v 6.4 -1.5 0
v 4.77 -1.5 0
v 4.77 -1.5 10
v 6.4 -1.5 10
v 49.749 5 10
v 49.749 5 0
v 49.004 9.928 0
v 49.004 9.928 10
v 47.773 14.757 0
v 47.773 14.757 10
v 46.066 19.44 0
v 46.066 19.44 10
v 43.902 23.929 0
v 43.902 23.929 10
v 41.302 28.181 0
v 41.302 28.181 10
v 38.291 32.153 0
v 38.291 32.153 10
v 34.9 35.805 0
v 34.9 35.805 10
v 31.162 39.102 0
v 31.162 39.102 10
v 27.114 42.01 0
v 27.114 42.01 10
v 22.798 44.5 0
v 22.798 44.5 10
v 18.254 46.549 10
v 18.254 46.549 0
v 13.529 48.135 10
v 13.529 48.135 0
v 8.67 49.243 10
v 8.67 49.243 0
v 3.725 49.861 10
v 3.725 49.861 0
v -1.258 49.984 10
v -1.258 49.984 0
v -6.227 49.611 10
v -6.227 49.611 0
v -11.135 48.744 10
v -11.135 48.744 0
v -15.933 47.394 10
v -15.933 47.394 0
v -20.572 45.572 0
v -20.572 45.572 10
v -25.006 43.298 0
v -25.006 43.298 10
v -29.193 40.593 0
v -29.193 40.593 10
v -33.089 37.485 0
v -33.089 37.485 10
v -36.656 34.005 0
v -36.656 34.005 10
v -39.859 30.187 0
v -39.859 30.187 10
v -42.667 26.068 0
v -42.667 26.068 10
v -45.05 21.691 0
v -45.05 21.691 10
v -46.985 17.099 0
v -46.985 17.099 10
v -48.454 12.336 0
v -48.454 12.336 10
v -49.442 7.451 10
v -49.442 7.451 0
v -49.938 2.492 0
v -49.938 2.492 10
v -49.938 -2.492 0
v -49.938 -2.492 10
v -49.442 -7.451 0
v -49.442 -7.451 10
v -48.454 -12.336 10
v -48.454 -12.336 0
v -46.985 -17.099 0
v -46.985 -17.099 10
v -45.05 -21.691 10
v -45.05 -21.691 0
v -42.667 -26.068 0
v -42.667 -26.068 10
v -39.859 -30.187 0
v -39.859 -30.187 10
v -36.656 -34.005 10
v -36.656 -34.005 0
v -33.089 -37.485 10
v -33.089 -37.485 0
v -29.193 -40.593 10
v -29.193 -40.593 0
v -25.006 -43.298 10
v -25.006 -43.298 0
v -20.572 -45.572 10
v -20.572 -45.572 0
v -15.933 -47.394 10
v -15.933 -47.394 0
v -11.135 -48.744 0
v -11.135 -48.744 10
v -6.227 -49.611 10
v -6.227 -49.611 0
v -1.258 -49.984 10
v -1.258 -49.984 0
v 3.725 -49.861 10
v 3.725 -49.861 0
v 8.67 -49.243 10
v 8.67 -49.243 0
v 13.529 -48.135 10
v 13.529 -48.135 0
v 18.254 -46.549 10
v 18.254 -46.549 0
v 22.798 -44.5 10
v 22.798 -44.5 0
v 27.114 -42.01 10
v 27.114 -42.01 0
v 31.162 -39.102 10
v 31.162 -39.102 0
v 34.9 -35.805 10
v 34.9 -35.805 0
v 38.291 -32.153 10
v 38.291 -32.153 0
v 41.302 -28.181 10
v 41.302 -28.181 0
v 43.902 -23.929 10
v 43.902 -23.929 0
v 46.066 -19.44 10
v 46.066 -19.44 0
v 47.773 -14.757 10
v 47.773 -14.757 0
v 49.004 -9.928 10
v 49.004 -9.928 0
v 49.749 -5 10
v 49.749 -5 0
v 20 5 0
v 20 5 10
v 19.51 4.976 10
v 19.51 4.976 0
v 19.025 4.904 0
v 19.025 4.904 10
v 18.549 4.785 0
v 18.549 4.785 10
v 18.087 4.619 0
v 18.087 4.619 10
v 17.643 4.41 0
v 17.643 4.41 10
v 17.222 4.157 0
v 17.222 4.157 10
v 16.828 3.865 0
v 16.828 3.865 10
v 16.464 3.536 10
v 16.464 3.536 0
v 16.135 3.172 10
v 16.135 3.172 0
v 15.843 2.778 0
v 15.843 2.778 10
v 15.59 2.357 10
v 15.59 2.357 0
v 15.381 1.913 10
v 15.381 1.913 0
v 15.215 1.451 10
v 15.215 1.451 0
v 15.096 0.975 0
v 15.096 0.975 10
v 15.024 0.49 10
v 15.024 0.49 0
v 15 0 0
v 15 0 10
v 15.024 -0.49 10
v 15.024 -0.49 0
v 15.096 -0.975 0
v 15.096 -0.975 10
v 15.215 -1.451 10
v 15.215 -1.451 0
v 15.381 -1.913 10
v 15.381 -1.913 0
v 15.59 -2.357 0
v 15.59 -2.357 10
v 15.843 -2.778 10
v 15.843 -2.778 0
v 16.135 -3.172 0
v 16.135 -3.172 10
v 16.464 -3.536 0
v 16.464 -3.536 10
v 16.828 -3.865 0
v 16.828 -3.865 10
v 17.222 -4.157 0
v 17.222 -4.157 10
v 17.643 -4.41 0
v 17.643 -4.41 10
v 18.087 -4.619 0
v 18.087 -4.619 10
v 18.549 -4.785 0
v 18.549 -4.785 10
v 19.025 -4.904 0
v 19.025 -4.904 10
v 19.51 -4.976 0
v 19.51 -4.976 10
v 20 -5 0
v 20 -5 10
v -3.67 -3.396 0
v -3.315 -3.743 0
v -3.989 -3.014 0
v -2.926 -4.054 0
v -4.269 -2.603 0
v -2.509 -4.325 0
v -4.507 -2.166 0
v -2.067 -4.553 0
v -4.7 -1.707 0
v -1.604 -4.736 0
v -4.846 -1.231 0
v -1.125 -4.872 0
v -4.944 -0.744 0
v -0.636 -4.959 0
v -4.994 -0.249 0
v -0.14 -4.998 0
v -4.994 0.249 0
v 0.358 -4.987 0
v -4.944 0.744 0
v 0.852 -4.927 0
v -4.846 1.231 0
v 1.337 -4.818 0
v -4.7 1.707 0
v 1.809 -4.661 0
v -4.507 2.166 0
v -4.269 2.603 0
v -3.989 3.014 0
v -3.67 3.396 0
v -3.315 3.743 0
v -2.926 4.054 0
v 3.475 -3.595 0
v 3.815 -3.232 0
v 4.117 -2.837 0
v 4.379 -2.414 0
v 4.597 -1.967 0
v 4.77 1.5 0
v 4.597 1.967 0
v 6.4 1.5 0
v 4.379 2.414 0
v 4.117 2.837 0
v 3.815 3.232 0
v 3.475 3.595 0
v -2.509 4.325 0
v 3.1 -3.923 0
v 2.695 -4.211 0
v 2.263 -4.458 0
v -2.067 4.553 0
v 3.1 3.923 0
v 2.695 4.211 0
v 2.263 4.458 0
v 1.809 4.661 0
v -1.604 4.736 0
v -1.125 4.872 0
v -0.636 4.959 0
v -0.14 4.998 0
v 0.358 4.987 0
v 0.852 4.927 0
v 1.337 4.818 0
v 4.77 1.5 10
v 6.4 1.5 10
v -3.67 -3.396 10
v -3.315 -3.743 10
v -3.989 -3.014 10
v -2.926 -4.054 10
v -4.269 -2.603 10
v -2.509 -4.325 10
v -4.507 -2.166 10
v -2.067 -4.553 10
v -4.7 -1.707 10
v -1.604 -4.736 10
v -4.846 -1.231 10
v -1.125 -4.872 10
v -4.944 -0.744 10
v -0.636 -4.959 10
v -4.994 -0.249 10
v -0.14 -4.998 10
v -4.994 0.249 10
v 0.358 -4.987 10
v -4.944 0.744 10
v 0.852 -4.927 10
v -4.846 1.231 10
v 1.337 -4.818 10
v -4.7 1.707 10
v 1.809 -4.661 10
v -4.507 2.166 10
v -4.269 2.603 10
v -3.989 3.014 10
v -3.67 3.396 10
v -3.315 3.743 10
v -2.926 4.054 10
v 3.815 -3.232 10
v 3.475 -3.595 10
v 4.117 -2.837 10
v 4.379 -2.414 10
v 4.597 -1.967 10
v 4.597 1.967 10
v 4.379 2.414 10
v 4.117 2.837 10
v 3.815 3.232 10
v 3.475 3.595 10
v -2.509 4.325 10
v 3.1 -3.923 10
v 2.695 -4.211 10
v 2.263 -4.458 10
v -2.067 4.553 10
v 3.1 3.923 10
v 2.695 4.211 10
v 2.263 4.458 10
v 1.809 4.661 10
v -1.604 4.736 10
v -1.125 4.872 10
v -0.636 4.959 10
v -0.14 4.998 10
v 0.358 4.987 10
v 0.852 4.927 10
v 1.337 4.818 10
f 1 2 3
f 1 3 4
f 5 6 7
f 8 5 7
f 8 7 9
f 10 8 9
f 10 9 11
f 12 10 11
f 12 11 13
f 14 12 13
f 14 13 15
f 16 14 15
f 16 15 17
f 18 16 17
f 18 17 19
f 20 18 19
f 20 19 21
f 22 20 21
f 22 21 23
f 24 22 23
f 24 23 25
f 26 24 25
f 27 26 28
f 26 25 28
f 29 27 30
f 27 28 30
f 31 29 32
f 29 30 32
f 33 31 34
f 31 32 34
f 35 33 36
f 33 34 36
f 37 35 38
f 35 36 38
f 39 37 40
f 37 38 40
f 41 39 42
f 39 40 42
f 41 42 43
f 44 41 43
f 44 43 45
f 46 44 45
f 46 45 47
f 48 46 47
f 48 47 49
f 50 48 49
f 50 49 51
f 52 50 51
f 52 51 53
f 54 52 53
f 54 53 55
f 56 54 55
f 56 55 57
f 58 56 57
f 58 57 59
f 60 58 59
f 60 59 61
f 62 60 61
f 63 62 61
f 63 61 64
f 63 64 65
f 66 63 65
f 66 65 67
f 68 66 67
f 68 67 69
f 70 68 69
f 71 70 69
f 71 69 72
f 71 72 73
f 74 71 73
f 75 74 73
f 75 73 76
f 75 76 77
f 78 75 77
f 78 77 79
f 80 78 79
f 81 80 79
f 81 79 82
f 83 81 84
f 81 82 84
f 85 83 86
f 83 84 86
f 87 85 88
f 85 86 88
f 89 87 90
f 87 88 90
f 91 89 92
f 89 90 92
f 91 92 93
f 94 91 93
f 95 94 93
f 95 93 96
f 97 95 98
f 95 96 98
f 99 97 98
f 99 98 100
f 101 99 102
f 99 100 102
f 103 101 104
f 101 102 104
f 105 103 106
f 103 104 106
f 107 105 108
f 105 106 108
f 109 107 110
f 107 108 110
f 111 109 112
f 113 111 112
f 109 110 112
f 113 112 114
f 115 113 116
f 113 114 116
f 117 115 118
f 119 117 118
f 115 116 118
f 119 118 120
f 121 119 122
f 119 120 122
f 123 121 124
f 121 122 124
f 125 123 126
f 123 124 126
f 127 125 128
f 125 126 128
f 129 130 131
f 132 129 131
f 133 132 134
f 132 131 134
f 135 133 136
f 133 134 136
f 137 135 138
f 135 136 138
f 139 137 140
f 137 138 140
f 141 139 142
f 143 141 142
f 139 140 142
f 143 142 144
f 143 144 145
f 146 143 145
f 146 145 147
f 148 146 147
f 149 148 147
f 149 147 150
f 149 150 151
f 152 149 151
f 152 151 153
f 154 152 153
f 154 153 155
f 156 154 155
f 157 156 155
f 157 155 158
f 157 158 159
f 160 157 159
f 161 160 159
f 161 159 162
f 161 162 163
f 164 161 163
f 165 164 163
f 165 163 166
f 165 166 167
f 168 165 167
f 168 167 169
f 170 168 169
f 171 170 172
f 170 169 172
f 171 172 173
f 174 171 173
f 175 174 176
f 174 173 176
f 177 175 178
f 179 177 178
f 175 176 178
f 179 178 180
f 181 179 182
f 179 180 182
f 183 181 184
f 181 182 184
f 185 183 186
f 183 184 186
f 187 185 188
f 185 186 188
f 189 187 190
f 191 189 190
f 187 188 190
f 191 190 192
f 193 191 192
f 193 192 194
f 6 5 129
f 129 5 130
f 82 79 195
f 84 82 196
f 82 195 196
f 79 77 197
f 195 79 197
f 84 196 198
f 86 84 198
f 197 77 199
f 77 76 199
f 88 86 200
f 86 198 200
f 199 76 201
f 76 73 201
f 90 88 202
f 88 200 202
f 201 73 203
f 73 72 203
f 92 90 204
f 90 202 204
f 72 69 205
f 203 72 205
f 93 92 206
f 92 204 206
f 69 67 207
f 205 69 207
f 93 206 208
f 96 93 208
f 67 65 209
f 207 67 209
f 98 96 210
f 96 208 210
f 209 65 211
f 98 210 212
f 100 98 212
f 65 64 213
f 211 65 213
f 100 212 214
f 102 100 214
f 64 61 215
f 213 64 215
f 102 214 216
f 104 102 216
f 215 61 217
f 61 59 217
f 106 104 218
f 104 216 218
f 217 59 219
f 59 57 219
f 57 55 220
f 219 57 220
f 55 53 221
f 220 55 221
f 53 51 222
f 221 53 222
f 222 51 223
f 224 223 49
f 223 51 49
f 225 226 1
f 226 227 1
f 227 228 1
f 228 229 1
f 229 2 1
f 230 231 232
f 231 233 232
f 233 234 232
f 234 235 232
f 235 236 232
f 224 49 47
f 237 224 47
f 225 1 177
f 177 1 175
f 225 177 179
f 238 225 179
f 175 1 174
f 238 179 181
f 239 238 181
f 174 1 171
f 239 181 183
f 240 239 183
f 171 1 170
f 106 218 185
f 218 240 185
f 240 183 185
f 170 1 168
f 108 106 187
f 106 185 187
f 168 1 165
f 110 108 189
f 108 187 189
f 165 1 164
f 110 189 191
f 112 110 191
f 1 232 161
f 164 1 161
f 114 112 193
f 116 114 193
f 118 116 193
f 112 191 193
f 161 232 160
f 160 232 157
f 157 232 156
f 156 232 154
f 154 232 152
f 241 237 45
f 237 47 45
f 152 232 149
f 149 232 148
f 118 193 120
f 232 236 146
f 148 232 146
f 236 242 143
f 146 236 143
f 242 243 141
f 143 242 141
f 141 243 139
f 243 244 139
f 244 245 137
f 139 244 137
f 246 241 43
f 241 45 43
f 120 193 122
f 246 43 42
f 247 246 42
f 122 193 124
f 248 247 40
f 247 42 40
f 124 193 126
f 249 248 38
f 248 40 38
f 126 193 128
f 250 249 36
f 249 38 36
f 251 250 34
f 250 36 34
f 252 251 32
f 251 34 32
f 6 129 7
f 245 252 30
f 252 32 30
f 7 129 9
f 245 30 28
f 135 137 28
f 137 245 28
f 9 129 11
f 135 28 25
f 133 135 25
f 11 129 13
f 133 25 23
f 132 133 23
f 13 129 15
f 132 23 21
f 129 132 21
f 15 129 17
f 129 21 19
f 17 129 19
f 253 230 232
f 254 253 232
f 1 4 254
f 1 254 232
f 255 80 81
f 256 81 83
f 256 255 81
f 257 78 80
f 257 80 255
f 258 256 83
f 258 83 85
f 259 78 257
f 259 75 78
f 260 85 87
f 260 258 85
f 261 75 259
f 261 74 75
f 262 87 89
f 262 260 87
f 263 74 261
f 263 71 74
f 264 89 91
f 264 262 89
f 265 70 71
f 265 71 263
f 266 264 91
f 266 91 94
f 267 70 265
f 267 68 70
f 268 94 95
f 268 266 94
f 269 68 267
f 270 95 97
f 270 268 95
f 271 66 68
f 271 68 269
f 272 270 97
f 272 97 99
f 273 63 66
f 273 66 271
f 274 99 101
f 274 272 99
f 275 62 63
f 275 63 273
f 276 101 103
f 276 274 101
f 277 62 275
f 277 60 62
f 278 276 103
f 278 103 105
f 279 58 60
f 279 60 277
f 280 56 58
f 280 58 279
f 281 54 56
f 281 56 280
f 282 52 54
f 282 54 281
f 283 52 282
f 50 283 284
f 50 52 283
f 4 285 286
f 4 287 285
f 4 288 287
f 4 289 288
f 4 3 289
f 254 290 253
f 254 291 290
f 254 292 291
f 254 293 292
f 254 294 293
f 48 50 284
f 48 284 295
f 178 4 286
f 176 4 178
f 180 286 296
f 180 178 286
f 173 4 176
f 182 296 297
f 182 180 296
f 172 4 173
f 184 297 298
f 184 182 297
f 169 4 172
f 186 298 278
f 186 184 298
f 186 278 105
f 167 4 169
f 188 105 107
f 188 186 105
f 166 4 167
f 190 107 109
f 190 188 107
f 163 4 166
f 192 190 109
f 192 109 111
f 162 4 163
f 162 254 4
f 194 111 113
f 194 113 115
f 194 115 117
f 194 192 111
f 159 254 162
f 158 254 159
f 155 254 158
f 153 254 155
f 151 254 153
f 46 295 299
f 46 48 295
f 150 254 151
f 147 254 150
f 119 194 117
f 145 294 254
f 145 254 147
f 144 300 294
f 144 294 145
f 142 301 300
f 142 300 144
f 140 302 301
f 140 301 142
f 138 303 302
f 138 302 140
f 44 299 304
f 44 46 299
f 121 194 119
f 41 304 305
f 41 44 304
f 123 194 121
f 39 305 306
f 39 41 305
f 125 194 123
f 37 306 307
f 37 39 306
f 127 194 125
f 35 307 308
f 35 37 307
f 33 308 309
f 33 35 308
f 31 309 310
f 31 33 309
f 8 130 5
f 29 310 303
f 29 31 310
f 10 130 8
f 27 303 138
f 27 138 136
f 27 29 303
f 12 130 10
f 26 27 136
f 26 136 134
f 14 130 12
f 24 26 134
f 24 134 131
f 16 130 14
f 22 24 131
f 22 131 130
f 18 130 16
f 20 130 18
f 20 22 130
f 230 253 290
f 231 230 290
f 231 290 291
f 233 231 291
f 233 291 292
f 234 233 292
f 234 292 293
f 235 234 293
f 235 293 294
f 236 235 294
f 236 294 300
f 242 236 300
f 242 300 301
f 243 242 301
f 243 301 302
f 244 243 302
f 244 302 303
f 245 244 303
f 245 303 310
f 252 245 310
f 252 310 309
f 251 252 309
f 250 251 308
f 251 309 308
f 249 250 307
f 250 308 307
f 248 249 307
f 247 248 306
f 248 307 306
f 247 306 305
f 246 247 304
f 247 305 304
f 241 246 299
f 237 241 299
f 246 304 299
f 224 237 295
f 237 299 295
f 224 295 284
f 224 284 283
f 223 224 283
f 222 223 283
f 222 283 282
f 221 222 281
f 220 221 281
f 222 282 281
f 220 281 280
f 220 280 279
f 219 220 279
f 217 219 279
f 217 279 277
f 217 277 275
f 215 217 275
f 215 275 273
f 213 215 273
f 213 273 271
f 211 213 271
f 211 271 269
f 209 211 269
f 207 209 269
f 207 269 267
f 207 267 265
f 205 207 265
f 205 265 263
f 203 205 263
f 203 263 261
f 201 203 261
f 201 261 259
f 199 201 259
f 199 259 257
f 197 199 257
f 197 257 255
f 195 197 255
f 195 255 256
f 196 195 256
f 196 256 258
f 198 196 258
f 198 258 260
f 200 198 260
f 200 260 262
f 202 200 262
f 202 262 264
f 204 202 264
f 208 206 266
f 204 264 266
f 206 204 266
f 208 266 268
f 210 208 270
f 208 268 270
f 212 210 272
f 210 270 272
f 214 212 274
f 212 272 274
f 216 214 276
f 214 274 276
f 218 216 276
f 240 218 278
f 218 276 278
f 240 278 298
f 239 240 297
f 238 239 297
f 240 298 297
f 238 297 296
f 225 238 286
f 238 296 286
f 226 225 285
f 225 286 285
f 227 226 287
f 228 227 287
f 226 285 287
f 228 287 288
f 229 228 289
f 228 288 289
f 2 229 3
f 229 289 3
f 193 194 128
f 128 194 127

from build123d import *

# Parameters (mm, degrees)
SKETCH_1_R               = 50
EXTRUDE_1_DEPTH          = 10
SKETCH_2_R               = 5
CUT_EXTRUDE_1_DEPTH      = 72.414284285
CUT_EXTRUDE_START        = -1.5
CUT_EXTRUDE_12_OUTLINE_W = 2.4
CUT_EXTRUDE_12_OUTLINE_H = 10
CUT_EXTRUDE_12_DEPTH     = 3
CUT_EXTRUDE_13_DEPTH     = 72.414284285


# Read off the part's stored shape, not the designer's step: 切除-拉伸12
with BuildPart() as part:
    # 草图1 → 凸台-拉伸1 (new body)
    with BuildSketch(Plane.XY):
        Circle(SKETCH_1_R)
    extrude(amount=EXTRUDE_1_DEPTH)

    # 草图2 → 切除-拉伸1 (cut, through all)
    with BuildSketch(Plane.XY.offset(10)):
        Circle(SKETCH_2_R)
    extrude(amount=-CUT_EXTRUDE_1_DEPTH, mode=Mode.SUBTRACT)

    # 切除-拉伸12 outline → 切除-拉伸12 (cut)
    with BuildSketch(Plane(origin=(0, 0, 0), x_dir=(1, 0, 0), z_dir=(0, 1, 0)).offset(CUT_EXTRUDE_START)):
        with Locations((5.2, -5)):
            Rectangle(CUT_EXTRUDE_12_OUTLINE_W, CUT_EXTRUDE_12_OUTLINE_H)
    extrude(amount=CUT_EXTRUDE_12_DEPTH, mode=Mode.SUBTRACT)

    # 草图24 → 切除-拉伸13 (cut, through all)
    with BuildSketch(Plane.XY.offset(10)):
        with BuildLine():
            Line((20, -5), (50, -5))
            ThreePointArc((50, -5), (55, 0), (50, 5))
            Line((50, 5), (20, 5))
            ThreePointArc((20, 5), (15, 0), (20, -5))
        make_face()
    extrude(amount=-CUT_EXTRUDE_13_DEPTH, mode=Mode.SUBTRACT)


solid = part.part
